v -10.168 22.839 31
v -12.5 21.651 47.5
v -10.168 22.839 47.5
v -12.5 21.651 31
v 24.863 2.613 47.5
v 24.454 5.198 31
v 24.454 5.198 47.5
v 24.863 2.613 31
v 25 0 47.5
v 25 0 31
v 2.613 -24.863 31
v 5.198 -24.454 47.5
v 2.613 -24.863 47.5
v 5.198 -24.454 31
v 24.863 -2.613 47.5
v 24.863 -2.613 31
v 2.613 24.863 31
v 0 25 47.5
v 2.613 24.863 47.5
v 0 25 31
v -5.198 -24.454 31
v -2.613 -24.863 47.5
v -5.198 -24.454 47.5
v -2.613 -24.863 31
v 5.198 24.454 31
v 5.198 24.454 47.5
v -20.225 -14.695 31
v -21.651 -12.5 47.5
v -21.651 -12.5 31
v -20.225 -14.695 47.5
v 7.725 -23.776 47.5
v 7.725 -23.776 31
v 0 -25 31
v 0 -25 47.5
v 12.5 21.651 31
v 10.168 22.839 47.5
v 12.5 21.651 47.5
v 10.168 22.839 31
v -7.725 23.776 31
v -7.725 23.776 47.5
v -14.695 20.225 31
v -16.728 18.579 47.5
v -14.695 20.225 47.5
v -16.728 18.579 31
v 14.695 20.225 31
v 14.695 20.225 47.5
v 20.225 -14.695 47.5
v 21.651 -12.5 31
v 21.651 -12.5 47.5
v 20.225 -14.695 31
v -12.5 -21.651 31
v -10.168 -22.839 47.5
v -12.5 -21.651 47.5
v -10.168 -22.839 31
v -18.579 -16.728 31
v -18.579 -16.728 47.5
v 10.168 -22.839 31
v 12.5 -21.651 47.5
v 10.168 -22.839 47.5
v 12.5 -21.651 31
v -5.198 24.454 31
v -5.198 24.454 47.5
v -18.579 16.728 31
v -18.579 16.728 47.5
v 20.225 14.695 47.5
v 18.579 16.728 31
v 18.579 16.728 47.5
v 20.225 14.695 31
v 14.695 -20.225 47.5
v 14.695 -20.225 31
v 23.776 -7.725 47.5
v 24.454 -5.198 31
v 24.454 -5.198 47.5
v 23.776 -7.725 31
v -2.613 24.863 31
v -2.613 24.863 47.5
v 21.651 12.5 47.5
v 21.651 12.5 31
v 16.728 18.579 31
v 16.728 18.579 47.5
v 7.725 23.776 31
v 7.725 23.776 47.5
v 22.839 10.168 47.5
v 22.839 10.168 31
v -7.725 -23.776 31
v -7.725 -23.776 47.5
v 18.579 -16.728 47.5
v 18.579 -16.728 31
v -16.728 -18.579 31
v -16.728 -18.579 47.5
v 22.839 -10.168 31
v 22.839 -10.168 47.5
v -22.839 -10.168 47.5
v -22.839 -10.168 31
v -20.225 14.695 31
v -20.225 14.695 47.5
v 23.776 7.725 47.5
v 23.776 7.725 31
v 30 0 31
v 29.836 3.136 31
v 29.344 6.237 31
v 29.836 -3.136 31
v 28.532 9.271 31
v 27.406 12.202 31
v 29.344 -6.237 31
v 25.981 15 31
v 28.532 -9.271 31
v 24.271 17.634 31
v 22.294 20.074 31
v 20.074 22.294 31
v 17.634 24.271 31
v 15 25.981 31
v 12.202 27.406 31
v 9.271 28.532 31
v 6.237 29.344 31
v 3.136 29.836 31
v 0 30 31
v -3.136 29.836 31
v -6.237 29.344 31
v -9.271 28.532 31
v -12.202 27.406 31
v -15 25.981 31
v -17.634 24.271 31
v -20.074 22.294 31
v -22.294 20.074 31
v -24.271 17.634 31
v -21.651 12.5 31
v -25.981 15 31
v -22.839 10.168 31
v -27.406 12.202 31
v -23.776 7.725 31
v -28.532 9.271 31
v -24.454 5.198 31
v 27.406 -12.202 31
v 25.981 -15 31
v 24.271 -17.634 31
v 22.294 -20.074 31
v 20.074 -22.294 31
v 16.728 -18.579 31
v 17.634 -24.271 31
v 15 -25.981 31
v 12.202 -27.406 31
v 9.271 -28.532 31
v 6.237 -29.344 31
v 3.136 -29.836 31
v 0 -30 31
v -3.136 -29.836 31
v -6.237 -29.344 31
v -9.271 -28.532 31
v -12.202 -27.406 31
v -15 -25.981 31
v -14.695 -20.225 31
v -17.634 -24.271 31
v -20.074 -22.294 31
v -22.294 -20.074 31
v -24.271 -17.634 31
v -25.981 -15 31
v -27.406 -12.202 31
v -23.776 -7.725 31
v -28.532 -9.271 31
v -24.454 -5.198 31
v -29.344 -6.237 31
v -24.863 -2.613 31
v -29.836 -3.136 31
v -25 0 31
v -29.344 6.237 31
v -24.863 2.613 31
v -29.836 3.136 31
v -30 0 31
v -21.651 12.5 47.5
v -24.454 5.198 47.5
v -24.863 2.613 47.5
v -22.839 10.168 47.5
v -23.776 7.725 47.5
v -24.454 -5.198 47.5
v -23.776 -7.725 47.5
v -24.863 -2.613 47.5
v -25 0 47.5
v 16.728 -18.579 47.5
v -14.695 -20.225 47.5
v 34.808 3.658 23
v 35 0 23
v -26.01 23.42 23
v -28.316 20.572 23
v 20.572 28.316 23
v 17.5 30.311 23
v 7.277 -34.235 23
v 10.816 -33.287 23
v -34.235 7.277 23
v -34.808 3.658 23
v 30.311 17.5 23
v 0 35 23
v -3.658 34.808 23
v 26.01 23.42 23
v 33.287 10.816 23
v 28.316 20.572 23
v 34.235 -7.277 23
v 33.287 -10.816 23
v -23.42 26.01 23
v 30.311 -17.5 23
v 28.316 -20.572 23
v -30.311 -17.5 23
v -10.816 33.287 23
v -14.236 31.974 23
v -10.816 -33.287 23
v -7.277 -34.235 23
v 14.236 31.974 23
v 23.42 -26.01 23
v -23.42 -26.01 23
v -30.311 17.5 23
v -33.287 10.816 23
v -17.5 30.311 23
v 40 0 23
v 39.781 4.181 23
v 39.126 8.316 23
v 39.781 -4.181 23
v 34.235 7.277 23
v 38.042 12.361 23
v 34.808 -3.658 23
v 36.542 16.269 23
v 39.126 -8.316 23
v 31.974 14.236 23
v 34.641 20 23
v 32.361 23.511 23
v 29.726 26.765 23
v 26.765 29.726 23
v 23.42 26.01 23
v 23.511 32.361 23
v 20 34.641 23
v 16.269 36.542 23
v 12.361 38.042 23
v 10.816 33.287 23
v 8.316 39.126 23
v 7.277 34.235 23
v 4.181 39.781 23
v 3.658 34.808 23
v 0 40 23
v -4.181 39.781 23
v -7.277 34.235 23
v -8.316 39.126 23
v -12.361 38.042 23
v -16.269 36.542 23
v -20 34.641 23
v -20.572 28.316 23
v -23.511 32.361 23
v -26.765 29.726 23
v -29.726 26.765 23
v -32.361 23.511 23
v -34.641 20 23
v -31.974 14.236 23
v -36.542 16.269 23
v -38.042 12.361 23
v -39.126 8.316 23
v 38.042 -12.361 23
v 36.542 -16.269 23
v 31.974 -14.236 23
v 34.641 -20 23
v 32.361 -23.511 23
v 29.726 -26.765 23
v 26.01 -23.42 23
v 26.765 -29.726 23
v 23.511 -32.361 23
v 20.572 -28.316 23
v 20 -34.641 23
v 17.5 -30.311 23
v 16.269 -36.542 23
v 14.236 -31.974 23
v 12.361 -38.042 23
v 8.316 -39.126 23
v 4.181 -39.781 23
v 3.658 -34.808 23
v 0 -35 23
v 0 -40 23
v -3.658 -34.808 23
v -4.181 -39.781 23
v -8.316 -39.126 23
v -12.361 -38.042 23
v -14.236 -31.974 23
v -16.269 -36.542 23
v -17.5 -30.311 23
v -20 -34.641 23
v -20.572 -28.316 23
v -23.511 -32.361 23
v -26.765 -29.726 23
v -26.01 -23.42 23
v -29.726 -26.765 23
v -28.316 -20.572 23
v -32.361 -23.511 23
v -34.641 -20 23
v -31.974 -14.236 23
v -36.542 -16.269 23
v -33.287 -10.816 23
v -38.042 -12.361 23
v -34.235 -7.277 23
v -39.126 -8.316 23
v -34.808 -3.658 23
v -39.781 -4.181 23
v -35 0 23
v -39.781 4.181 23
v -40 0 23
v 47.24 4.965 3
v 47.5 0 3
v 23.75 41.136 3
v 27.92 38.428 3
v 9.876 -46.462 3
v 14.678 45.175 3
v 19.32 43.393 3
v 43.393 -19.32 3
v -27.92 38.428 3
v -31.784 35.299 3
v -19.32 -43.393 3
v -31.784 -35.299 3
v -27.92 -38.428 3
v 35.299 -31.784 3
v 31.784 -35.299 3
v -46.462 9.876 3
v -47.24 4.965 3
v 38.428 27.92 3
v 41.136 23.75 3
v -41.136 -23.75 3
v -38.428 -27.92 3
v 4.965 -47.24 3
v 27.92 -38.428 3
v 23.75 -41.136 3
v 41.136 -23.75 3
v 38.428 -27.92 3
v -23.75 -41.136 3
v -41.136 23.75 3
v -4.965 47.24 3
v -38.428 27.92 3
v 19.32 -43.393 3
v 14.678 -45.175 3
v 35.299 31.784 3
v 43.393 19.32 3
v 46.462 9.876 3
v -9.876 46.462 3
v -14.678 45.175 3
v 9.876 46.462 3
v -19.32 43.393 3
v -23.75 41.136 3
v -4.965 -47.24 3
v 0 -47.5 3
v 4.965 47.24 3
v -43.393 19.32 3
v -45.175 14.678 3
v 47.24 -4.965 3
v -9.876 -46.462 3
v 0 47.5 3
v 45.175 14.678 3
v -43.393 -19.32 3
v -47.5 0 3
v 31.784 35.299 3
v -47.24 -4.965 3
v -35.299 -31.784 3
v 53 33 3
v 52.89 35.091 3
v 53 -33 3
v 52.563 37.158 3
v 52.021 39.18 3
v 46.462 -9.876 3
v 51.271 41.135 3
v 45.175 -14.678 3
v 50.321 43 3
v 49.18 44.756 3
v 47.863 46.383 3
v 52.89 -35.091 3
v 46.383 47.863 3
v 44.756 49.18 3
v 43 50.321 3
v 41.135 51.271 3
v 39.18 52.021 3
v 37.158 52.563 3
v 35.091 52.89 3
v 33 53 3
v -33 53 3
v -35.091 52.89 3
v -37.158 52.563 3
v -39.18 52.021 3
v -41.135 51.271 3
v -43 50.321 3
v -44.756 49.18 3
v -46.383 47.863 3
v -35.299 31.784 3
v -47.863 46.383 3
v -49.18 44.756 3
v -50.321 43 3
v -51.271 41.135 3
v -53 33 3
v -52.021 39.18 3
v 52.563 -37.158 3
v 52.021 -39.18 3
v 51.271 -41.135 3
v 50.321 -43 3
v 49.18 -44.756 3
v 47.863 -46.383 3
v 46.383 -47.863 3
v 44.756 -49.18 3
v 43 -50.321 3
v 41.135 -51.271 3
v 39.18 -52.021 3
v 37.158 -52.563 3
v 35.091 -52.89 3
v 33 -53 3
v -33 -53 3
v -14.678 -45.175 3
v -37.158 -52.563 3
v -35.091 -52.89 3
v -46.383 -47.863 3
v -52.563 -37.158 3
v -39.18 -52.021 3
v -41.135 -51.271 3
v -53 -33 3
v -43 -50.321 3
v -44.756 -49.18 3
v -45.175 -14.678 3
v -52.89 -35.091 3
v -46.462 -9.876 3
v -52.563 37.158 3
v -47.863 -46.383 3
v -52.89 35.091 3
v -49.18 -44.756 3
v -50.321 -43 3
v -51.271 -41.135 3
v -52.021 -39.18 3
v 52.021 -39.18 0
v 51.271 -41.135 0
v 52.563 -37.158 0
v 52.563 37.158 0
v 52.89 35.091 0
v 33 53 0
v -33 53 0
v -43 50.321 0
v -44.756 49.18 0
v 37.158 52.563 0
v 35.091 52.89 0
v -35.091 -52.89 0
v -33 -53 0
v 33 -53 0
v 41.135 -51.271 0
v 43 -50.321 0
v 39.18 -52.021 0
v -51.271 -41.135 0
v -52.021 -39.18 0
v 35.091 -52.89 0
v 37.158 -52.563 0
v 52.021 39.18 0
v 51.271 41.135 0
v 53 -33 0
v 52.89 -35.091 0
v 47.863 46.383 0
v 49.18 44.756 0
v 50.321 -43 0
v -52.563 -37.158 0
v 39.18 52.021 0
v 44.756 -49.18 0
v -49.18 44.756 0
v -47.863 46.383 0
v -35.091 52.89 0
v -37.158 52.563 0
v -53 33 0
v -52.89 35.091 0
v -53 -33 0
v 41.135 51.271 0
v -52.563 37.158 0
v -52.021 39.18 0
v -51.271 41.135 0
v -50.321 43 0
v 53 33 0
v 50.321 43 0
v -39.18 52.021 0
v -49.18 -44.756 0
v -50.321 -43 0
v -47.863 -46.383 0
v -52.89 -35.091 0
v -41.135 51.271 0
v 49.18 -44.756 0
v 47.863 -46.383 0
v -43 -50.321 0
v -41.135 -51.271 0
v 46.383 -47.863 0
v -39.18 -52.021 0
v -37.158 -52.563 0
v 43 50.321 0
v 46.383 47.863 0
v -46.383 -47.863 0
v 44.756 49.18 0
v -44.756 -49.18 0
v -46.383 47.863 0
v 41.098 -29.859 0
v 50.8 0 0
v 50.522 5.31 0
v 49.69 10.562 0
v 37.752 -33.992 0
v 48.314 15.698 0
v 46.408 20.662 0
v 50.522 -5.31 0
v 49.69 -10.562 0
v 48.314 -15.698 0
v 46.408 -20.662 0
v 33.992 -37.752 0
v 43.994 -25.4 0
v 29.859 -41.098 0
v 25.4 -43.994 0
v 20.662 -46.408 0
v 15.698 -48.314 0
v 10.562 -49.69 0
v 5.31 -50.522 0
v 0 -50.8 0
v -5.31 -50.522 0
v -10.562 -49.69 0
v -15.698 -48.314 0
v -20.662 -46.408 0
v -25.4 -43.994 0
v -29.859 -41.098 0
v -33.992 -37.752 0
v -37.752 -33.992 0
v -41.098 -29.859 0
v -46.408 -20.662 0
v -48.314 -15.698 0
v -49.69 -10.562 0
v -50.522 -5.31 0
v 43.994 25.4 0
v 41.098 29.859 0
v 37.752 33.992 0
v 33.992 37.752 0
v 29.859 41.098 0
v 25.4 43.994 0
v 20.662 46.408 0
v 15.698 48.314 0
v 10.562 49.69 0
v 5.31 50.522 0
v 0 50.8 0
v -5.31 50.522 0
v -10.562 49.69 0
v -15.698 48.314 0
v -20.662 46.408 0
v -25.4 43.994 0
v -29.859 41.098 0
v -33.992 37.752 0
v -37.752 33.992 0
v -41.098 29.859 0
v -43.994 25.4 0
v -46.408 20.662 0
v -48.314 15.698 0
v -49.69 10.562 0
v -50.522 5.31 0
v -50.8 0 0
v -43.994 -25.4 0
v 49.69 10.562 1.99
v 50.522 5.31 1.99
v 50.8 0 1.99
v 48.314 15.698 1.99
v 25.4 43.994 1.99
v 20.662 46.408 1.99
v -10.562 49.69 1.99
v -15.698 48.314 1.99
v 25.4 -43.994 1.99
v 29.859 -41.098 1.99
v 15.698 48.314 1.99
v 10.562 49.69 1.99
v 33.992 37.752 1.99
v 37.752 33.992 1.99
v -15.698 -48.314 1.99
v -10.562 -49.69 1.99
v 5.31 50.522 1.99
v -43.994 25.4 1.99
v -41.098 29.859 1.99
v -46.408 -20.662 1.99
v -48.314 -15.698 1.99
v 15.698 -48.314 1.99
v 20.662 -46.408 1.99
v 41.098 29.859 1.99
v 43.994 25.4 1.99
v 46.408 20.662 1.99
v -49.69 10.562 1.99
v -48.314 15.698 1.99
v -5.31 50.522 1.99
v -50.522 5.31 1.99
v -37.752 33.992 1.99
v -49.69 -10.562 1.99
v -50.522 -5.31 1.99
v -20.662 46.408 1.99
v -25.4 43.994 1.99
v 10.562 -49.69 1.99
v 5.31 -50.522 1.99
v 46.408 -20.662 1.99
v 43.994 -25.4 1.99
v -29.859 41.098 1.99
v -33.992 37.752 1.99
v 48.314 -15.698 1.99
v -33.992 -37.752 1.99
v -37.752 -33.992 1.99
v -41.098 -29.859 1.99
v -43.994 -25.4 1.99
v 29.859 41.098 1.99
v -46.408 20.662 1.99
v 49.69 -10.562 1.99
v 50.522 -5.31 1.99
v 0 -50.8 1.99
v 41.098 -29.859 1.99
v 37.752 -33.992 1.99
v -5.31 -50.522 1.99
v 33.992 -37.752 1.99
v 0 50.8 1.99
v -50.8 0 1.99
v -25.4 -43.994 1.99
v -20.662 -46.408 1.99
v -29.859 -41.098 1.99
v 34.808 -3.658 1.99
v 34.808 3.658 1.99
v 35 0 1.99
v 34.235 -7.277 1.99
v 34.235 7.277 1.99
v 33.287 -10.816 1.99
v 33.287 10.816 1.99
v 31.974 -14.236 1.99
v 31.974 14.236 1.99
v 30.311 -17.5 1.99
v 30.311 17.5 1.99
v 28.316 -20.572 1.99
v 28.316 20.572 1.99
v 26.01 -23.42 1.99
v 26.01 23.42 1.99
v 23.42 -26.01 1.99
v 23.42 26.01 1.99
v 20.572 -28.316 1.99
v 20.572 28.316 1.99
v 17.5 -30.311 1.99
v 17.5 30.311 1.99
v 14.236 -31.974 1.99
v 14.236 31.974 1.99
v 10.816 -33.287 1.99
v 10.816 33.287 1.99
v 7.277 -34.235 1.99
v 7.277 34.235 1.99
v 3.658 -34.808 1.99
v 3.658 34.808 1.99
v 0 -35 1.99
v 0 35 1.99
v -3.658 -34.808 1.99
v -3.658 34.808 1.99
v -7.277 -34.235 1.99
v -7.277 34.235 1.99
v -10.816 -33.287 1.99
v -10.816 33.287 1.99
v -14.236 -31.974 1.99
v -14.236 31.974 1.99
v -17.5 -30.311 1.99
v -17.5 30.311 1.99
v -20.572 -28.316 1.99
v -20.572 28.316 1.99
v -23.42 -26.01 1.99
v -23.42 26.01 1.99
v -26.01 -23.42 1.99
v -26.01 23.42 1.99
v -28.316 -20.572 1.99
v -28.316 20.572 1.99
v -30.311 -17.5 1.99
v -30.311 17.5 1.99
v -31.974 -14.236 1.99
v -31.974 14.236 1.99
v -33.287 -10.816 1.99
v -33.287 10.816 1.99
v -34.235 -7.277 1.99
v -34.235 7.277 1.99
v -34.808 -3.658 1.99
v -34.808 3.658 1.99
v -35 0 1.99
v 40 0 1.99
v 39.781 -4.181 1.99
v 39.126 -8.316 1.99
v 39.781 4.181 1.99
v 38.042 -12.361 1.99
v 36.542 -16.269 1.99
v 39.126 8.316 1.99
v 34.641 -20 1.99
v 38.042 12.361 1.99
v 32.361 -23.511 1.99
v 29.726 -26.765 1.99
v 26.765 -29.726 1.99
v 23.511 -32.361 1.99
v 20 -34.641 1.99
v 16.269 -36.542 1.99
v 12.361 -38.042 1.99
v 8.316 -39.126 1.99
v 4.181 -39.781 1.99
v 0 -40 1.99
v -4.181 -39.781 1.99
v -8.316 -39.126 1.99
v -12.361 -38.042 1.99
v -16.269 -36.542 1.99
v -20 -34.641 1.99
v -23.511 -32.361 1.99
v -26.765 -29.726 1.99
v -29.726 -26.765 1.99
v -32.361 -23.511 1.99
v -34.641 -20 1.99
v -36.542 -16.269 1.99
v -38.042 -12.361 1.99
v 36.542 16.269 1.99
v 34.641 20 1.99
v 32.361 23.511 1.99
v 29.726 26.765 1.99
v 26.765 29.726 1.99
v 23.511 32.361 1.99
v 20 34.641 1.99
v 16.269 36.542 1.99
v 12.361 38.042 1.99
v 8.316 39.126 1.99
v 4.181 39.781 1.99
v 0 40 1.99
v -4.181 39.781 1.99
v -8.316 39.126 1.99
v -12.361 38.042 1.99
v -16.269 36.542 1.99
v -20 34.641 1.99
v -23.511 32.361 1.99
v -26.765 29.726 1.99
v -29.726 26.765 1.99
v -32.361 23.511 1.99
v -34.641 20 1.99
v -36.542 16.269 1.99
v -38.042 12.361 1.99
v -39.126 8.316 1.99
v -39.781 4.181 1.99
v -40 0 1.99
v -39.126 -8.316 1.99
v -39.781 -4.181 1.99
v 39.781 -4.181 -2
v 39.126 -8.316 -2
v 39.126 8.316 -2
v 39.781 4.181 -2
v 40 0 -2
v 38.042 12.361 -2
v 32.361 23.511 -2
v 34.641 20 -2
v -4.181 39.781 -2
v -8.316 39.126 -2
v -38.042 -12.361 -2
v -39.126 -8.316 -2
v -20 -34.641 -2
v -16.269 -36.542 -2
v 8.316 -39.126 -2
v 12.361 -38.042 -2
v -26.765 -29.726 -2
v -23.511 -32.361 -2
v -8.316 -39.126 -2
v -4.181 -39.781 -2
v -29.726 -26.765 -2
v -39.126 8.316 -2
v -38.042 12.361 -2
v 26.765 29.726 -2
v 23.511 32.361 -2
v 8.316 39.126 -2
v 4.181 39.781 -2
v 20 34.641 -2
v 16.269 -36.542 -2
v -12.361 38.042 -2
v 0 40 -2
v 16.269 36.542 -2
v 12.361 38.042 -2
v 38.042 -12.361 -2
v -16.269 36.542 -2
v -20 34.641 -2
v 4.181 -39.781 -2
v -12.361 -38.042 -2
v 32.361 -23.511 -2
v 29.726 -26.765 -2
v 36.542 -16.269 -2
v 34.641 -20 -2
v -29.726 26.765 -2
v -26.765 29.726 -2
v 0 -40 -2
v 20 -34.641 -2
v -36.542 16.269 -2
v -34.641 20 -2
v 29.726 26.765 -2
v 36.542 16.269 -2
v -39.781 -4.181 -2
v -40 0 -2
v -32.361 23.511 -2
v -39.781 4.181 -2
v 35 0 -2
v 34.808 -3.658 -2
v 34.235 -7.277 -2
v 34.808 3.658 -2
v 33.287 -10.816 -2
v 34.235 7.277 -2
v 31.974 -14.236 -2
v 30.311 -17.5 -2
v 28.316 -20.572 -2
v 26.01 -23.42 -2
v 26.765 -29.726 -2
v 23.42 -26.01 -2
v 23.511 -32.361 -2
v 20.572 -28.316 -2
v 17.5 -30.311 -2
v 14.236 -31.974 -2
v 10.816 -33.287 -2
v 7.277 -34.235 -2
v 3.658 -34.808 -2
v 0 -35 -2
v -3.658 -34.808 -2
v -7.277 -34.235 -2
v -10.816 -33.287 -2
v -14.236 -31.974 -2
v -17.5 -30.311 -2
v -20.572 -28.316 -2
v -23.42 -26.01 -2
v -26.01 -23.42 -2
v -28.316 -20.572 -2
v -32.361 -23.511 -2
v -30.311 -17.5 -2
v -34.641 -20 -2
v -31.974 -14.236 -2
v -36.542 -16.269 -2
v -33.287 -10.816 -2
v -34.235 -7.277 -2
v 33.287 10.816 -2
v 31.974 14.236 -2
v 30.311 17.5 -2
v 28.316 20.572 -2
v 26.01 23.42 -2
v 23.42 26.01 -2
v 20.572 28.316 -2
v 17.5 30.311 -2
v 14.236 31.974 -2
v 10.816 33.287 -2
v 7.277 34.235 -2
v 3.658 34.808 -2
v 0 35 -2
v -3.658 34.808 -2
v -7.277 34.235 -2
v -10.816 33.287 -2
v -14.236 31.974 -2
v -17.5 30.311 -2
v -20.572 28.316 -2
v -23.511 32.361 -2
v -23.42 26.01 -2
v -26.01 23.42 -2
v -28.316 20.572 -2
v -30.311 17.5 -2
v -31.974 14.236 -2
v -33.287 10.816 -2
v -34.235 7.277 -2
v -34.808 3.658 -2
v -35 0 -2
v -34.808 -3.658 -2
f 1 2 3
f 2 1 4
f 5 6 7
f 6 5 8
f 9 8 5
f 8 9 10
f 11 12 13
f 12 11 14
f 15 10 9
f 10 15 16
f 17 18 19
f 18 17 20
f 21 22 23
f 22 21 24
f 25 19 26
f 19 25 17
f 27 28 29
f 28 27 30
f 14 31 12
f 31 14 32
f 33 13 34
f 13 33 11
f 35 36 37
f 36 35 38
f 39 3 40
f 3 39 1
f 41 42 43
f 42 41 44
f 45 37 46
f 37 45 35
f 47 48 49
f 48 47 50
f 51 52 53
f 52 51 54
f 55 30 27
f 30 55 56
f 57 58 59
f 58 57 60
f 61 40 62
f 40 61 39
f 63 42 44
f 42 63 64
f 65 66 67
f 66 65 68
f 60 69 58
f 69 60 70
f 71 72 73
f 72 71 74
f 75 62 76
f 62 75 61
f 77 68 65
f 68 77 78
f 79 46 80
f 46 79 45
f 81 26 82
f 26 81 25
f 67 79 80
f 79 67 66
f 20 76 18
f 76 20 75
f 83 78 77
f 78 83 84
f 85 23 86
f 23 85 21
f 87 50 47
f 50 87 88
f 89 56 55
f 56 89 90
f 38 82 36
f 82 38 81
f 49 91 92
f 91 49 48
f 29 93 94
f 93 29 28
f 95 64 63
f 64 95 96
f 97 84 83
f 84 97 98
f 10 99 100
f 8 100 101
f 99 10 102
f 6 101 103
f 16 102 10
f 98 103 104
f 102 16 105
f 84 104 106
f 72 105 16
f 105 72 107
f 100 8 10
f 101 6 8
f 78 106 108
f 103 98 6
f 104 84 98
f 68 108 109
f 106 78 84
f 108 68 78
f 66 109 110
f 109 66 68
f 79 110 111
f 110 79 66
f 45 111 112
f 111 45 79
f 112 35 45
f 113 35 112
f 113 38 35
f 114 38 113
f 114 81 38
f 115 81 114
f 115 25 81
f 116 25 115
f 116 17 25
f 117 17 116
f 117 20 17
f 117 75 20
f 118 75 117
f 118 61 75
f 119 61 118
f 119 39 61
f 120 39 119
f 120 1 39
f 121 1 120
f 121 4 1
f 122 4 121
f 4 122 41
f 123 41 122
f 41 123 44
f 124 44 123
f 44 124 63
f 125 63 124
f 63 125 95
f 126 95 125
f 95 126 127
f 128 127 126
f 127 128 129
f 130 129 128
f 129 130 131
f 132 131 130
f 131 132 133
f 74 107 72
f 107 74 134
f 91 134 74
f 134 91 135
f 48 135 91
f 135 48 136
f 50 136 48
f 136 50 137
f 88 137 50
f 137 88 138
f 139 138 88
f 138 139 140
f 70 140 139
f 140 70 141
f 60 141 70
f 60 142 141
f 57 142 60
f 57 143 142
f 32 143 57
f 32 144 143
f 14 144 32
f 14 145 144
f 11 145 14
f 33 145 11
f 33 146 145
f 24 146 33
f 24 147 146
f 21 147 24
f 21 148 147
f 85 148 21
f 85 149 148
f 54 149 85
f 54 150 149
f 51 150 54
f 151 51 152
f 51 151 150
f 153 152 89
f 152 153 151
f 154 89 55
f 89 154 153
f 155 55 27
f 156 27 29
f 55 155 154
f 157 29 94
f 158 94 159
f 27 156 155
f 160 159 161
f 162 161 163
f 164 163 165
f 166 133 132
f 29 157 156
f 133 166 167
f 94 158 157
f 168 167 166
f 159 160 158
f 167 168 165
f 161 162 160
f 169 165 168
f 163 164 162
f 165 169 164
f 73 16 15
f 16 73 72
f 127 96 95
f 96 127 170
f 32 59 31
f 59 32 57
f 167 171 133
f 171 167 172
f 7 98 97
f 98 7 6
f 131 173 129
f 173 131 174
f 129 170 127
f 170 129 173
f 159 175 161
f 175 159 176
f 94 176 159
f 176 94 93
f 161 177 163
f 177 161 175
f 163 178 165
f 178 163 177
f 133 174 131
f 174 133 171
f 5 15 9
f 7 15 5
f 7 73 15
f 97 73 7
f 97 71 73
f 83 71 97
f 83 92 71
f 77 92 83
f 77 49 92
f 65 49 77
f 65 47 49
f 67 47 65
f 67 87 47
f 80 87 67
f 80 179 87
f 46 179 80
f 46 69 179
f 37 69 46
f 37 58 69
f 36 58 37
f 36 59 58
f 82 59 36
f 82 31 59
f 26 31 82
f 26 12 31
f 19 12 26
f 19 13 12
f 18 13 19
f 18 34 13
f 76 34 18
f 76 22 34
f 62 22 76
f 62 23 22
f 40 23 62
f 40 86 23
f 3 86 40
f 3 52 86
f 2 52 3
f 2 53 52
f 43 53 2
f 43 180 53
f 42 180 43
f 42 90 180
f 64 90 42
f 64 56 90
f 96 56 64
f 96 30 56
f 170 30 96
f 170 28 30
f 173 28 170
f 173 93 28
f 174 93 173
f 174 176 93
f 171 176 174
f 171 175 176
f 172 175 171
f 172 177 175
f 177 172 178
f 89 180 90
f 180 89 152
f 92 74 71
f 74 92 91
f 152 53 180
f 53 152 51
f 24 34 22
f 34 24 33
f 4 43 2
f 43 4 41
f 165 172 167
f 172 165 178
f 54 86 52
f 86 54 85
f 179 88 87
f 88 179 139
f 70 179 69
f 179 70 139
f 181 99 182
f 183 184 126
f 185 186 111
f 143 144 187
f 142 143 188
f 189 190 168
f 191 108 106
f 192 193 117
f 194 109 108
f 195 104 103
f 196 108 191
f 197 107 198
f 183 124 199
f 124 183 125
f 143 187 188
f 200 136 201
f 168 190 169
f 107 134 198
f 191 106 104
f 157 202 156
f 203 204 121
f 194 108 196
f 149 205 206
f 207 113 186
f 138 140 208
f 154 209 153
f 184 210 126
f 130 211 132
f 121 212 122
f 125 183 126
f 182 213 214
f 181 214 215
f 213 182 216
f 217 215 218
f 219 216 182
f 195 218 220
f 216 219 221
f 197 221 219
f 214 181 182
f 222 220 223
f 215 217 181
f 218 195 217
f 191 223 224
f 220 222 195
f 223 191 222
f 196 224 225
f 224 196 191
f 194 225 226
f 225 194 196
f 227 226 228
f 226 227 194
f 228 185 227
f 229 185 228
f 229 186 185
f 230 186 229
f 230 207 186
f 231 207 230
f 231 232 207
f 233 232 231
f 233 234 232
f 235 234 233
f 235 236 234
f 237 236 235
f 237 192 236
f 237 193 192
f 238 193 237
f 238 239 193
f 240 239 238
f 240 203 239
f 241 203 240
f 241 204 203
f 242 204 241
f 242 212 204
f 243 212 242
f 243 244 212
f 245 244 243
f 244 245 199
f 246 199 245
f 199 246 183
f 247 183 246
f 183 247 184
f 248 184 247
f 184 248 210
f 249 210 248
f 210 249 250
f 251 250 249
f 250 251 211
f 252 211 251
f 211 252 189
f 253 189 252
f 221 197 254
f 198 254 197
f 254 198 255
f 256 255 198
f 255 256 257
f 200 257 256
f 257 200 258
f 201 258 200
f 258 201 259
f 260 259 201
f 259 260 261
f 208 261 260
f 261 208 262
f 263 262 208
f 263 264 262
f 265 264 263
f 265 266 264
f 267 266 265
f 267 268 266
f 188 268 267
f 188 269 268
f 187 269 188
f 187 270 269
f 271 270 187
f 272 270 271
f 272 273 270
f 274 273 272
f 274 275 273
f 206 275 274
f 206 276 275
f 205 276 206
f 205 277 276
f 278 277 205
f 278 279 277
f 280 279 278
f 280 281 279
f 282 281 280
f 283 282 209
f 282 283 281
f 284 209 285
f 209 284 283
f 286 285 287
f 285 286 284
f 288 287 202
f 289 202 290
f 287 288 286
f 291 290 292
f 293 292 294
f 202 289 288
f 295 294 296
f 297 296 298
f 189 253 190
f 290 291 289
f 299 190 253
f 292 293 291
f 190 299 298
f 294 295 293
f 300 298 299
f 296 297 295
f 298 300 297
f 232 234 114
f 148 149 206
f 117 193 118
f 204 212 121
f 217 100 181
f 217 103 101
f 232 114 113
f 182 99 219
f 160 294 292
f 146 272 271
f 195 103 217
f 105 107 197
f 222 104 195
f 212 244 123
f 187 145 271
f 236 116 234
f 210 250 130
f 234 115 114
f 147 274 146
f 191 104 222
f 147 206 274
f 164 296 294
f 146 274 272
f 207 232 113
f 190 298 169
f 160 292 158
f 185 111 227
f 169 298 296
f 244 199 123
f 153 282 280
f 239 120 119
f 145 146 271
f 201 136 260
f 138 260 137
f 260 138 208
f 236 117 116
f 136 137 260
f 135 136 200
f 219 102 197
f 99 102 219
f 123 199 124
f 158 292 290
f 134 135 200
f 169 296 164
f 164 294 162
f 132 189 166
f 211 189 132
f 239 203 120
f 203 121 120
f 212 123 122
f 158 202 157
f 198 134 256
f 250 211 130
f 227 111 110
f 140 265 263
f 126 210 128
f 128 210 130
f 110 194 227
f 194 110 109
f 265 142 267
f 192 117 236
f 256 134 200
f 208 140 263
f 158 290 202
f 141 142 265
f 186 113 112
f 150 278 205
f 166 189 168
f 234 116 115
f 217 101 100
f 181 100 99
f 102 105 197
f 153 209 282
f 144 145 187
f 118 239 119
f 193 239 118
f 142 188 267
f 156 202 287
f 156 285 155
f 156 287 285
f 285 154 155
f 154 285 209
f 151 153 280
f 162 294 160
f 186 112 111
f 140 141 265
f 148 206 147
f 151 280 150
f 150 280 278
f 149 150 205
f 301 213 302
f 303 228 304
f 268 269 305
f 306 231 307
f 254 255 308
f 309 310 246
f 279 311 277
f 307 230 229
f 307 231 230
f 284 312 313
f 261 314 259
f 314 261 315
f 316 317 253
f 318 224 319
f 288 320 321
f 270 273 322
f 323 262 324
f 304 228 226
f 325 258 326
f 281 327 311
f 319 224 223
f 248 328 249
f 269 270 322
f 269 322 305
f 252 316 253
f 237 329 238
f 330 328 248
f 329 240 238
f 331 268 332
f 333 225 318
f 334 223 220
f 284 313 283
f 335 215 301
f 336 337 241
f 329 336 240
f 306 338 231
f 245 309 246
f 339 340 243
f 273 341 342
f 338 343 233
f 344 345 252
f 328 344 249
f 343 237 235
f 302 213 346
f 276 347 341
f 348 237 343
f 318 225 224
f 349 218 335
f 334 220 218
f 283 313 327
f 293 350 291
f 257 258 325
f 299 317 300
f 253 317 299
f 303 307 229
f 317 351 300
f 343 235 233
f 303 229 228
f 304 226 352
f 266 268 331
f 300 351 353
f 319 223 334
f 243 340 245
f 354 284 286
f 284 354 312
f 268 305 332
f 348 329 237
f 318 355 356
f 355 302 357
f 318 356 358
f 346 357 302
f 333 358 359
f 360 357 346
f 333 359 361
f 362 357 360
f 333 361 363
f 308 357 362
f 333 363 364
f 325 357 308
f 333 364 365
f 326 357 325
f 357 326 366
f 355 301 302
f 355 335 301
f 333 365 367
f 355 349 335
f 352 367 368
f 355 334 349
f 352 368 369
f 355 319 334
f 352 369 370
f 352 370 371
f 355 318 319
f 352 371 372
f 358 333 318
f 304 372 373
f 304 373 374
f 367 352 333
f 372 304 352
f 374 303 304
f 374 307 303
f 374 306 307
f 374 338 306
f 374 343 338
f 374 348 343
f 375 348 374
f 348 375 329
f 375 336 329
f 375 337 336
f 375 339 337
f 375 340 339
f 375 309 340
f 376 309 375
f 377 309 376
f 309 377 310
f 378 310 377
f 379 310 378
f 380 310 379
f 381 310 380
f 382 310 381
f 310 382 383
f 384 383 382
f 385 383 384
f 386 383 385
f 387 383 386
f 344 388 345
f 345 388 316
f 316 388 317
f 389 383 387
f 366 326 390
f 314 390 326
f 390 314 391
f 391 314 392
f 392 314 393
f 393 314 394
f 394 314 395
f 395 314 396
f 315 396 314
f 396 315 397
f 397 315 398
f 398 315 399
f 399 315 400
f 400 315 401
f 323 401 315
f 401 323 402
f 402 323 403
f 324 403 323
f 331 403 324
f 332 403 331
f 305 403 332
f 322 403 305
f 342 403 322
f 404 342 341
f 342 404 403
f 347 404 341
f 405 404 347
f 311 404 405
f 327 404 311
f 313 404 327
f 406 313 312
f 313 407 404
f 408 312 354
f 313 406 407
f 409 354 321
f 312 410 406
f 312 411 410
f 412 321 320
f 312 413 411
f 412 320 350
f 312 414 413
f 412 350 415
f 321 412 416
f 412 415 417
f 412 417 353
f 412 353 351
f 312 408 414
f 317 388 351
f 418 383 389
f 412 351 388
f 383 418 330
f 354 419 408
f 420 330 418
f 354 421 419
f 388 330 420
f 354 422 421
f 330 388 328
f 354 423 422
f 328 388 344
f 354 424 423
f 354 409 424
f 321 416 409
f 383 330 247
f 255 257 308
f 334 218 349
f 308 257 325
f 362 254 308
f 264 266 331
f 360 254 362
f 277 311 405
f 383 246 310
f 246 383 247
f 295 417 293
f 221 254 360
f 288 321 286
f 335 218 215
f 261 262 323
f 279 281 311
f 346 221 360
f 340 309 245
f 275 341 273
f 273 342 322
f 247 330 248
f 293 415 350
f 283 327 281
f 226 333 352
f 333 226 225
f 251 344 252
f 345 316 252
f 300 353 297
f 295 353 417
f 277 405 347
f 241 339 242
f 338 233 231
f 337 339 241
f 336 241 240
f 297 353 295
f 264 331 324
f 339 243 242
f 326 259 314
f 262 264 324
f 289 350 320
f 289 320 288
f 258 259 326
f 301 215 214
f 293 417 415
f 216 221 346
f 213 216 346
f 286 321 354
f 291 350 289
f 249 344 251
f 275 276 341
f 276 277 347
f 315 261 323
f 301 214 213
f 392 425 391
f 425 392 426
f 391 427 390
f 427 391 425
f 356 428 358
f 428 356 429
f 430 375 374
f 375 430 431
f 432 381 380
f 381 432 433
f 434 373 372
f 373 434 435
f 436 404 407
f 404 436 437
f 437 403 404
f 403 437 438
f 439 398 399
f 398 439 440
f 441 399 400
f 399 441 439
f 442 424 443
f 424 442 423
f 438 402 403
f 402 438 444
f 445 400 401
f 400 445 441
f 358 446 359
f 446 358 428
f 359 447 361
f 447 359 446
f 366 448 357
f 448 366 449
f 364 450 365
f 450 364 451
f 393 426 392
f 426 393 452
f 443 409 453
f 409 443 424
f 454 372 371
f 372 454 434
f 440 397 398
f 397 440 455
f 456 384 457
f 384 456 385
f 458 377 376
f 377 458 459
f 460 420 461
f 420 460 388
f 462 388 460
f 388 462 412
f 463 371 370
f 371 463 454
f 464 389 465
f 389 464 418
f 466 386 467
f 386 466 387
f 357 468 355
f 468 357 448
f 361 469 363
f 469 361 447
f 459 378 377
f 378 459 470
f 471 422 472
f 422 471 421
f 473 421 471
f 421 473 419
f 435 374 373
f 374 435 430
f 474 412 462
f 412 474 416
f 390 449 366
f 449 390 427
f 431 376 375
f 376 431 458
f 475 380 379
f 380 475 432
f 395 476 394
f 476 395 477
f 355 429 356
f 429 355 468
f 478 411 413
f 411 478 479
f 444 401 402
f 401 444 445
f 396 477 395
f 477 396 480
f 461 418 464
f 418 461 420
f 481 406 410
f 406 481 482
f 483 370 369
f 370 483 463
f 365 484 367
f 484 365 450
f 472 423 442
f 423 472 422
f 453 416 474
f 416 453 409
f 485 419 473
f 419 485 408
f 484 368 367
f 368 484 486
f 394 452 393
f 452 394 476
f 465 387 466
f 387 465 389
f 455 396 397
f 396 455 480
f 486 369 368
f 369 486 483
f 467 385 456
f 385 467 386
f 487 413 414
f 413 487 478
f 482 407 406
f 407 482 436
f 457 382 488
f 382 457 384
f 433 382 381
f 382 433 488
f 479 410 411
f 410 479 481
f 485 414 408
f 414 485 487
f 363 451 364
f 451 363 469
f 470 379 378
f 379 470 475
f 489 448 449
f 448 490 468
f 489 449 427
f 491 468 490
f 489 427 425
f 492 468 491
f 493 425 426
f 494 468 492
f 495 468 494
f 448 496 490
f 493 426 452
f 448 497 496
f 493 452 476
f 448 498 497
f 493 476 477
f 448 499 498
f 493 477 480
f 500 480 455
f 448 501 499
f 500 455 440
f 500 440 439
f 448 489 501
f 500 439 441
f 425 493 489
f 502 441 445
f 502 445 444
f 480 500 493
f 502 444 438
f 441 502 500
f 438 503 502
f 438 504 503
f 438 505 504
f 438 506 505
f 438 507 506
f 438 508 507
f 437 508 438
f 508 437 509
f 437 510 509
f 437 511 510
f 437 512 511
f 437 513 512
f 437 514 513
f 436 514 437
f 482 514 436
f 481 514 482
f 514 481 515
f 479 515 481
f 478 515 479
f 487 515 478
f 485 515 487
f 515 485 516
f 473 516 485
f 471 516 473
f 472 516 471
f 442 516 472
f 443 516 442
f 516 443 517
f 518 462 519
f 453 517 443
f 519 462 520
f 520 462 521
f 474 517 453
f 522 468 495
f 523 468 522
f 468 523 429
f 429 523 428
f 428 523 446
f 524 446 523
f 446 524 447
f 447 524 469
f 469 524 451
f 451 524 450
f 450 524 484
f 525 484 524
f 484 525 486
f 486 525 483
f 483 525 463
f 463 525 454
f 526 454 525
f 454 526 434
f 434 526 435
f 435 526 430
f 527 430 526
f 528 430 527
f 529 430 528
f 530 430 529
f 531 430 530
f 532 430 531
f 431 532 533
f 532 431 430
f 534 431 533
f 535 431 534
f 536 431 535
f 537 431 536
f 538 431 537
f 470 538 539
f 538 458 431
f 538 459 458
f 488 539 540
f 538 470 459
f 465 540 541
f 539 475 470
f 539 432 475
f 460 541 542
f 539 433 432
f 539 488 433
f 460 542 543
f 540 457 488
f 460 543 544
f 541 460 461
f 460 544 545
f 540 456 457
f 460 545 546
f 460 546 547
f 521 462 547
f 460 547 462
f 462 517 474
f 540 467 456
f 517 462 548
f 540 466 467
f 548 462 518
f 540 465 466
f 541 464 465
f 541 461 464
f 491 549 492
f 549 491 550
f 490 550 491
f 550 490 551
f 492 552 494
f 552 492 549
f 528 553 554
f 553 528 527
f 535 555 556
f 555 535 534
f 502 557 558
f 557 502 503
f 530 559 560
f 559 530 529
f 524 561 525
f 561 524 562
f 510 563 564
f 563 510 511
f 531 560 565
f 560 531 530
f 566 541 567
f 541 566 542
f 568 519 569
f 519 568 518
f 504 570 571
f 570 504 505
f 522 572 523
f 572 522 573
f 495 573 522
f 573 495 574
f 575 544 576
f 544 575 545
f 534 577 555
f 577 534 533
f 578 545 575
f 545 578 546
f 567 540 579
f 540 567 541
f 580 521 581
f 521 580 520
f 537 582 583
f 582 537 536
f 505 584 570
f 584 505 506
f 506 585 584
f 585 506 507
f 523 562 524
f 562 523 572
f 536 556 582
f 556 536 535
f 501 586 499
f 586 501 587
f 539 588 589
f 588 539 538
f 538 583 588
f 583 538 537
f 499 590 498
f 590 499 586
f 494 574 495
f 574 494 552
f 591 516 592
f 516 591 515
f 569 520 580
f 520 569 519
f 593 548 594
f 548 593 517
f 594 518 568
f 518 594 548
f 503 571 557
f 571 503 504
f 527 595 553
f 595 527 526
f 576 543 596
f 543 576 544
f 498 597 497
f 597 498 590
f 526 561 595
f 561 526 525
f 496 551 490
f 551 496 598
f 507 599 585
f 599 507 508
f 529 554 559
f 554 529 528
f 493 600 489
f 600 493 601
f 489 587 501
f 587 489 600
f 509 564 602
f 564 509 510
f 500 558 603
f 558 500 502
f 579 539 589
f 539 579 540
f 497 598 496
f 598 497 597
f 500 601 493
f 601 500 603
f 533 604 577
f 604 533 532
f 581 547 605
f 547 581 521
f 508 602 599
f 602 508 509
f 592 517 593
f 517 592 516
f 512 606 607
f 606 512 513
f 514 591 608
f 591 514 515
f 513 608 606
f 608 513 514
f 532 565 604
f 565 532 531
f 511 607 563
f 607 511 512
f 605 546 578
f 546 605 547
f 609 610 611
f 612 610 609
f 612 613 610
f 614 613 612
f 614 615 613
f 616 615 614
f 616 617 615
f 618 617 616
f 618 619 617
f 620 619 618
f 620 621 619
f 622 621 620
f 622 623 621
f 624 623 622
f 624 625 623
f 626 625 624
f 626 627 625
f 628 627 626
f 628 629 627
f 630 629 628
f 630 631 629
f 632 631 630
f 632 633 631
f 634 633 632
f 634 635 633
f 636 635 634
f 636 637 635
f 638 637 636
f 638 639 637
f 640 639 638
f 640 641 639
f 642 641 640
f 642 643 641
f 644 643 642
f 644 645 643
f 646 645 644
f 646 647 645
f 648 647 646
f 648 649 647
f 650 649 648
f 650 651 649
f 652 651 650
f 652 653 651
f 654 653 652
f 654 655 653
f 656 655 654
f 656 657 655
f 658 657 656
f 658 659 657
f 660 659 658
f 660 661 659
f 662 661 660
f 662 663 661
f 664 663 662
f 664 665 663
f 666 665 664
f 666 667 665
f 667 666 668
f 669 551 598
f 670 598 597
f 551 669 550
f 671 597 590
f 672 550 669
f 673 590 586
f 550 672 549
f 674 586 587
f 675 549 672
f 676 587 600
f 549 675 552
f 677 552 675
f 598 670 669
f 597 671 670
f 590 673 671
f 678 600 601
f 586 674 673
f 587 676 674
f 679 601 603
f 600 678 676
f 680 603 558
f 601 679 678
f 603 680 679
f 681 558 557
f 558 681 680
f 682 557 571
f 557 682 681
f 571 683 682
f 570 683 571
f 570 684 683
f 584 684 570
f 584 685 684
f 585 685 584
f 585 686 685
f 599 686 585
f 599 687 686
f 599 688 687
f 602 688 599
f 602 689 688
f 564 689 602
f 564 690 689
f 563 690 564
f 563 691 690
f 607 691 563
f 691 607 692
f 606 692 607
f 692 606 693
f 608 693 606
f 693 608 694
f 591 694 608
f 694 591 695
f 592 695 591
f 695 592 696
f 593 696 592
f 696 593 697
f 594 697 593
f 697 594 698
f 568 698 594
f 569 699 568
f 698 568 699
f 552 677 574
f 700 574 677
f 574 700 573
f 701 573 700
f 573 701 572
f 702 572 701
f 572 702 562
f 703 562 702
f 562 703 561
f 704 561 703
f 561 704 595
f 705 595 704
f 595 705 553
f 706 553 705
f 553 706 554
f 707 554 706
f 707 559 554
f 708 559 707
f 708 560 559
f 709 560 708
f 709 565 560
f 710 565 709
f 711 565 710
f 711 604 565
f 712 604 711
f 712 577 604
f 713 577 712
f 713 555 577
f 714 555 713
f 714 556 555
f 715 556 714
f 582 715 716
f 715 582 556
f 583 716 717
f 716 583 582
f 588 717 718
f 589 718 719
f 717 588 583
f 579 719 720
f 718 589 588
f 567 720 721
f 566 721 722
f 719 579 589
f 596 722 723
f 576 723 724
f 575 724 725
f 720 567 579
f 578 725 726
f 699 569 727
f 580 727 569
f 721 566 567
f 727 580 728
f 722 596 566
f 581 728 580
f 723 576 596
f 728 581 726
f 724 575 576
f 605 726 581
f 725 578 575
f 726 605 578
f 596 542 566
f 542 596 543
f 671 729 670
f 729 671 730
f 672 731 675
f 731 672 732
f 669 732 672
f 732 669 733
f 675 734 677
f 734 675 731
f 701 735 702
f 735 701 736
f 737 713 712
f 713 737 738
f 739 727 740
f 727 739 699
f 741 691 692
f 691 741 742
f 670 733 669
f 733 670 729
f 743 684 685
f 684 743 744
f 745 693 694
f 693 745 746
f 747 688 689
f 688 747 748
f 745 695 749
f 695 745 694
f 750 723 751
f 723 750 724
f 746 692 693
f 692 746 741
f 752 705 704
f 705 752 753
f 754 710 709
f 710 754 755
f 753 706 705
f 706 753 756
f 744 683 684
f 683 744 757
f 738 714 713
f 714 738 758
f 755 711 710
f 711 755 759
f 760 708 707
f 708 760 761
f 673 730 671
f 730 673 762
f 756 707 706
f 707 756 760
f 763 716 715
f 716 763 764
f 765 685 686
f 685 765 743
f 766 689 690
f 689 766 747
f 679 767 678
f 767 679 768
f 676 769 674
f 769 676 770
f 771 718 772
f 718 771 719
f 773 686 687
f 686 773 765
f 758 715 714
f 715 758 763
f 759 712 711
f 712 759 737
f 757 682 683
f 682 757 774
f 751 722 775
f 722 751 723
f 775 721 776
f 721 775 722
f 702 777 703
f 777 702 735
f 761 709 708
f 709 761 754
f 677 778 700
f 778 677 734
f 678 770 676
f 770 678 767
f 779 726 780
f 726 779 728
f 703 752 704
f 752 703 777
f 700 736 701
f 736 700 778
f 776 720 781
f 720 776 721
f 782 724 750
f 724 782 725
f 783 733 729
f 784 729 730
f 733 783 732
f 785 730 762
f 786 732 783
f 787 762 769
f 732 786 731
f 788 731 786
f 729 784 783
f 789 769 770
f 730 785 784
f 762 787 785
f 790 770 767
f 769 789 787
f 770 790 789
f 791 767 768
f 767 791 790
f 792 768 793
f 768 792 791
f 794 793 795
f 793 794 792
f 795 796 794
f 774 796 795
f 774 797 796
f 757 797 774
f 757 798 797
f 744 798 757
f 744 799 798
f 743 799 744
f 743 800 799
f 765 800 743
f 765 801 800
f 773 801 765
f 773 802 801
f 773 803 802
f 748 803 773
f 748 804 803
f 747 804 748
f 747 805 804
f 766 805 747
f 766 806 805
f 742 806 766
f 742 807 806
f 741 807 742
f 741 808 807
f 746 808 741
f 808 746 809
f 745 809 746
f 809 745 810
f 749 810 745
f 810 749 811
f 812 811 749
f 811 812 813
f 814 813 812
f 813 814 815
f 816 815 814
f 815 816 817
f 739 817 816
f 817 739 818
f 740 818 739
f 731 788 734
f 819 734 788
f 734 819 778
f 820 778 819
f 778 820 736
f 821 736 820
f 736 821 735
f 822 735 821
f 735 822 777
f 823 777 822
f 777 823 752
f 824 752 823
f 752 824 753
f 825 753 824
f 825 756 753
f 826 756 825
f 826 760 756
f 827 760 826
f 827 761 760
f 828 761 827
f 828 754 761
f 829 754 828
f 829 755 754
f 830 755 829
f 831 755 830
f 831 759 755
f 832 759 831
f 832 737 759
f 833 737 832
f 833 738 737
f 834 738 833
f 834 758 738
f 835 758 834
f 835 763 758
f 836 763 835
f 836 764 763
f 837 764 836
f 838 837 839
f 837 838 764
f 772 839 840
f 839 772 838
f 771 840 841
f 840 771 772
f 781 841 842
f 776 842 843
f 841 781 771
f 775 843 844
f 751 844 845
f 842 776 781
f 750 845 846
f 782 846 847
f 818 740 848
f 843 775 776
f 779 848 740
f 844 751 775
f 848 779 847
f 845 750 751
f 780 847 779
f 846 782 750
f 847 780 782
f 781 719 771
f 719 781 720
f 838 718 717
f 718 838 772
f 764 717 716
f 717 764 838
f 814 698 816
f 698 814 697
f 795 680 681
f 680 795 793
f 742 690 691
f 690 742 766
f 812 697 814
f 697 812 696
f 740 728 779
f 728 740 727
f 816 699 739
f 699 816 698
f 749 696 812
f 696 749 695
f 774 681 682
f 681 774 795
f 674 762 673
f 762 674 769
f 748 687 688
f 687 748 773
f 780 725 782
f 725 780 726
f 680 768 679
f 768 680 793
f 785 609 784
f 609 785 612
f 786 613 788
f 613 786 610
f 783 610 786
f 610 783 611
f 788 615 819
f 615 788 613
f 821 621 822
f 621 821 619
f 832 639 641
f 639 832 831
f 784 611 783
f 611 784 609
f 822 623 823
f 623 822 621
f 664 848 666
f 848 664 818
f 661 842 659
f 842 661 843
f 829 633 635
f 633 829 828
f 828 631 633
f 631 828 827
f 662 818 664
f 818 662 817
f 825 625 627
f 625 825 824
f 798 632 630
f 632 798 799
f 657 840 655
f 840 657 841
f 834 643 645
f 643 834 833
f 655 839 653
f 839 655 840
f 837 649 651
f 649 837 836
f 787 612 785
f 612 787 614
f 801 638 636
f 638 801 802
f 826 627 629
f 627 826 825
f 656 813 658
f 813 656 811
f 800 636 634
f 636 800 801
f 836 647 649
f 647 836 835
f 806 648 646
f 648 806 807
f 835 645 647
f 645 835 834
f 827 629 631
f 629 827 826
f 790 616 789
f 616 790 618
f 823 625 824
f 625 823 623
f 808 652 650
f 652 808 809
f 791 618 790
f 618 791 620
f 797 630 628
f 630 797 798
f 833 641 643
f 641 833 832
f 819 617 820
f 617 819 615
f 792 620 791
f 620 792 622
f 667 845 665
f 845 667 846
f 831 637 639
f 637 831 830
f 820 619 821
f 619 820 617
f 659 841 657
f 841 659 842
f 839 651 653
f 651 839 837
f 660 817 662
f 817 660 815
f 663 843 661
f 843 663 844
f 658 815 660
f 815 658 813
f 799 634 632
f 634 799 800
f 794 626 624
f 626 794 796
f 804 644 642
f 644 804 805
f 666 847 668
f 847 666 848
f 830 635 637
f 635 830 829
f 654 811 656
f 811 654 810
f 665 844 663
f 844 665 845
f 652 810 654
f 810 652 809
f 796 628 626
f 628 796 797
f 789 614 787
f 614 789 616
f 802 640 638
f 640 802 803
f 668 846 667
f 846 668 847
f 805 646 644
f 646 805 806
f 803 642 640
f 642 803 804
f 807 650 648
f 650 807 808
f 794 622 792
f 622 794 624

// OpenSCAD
include <MCAD/units.scad>

$fn = 60;
speakerSize = 106;

module roundCube(width, length, height, cornerRadius) {
    hull() {
        for (x=[-1, 1], y=[-1, 1])
        translate([x * (width / 2 - cornerRadius), y * (length / 2 - cornerRadius), 0])
        cylinder(r=cornerRadius, h=height);
    }
}

module Speaker() {
    difference() {
        union() {
            translate([0, 0, 31])
            cylinder(r=50 / 2., h=16.5);

            translate([0, 0, 23])
            cylinder(r=70 / 2., r2=60 / 2., h=8);

            translate([0, 0, 3])
            cylinder(r=95 / 2., r2=80 / 2., h=20);
            
            roundCube(speakerSize, speakerSize, 3, 20);
         }
         
         translate([0, 0, -epsilon])
         cylinder(r=4*inch/2, h=2);
    }
    
    translate([0, 0, -2])
    difference() {
        cylinder(r=80 / 2., h=4);

        translate([0, 0, -epsilon])
        cylinder(r=70 / 2., h=4);
    }
}


Speaker();
